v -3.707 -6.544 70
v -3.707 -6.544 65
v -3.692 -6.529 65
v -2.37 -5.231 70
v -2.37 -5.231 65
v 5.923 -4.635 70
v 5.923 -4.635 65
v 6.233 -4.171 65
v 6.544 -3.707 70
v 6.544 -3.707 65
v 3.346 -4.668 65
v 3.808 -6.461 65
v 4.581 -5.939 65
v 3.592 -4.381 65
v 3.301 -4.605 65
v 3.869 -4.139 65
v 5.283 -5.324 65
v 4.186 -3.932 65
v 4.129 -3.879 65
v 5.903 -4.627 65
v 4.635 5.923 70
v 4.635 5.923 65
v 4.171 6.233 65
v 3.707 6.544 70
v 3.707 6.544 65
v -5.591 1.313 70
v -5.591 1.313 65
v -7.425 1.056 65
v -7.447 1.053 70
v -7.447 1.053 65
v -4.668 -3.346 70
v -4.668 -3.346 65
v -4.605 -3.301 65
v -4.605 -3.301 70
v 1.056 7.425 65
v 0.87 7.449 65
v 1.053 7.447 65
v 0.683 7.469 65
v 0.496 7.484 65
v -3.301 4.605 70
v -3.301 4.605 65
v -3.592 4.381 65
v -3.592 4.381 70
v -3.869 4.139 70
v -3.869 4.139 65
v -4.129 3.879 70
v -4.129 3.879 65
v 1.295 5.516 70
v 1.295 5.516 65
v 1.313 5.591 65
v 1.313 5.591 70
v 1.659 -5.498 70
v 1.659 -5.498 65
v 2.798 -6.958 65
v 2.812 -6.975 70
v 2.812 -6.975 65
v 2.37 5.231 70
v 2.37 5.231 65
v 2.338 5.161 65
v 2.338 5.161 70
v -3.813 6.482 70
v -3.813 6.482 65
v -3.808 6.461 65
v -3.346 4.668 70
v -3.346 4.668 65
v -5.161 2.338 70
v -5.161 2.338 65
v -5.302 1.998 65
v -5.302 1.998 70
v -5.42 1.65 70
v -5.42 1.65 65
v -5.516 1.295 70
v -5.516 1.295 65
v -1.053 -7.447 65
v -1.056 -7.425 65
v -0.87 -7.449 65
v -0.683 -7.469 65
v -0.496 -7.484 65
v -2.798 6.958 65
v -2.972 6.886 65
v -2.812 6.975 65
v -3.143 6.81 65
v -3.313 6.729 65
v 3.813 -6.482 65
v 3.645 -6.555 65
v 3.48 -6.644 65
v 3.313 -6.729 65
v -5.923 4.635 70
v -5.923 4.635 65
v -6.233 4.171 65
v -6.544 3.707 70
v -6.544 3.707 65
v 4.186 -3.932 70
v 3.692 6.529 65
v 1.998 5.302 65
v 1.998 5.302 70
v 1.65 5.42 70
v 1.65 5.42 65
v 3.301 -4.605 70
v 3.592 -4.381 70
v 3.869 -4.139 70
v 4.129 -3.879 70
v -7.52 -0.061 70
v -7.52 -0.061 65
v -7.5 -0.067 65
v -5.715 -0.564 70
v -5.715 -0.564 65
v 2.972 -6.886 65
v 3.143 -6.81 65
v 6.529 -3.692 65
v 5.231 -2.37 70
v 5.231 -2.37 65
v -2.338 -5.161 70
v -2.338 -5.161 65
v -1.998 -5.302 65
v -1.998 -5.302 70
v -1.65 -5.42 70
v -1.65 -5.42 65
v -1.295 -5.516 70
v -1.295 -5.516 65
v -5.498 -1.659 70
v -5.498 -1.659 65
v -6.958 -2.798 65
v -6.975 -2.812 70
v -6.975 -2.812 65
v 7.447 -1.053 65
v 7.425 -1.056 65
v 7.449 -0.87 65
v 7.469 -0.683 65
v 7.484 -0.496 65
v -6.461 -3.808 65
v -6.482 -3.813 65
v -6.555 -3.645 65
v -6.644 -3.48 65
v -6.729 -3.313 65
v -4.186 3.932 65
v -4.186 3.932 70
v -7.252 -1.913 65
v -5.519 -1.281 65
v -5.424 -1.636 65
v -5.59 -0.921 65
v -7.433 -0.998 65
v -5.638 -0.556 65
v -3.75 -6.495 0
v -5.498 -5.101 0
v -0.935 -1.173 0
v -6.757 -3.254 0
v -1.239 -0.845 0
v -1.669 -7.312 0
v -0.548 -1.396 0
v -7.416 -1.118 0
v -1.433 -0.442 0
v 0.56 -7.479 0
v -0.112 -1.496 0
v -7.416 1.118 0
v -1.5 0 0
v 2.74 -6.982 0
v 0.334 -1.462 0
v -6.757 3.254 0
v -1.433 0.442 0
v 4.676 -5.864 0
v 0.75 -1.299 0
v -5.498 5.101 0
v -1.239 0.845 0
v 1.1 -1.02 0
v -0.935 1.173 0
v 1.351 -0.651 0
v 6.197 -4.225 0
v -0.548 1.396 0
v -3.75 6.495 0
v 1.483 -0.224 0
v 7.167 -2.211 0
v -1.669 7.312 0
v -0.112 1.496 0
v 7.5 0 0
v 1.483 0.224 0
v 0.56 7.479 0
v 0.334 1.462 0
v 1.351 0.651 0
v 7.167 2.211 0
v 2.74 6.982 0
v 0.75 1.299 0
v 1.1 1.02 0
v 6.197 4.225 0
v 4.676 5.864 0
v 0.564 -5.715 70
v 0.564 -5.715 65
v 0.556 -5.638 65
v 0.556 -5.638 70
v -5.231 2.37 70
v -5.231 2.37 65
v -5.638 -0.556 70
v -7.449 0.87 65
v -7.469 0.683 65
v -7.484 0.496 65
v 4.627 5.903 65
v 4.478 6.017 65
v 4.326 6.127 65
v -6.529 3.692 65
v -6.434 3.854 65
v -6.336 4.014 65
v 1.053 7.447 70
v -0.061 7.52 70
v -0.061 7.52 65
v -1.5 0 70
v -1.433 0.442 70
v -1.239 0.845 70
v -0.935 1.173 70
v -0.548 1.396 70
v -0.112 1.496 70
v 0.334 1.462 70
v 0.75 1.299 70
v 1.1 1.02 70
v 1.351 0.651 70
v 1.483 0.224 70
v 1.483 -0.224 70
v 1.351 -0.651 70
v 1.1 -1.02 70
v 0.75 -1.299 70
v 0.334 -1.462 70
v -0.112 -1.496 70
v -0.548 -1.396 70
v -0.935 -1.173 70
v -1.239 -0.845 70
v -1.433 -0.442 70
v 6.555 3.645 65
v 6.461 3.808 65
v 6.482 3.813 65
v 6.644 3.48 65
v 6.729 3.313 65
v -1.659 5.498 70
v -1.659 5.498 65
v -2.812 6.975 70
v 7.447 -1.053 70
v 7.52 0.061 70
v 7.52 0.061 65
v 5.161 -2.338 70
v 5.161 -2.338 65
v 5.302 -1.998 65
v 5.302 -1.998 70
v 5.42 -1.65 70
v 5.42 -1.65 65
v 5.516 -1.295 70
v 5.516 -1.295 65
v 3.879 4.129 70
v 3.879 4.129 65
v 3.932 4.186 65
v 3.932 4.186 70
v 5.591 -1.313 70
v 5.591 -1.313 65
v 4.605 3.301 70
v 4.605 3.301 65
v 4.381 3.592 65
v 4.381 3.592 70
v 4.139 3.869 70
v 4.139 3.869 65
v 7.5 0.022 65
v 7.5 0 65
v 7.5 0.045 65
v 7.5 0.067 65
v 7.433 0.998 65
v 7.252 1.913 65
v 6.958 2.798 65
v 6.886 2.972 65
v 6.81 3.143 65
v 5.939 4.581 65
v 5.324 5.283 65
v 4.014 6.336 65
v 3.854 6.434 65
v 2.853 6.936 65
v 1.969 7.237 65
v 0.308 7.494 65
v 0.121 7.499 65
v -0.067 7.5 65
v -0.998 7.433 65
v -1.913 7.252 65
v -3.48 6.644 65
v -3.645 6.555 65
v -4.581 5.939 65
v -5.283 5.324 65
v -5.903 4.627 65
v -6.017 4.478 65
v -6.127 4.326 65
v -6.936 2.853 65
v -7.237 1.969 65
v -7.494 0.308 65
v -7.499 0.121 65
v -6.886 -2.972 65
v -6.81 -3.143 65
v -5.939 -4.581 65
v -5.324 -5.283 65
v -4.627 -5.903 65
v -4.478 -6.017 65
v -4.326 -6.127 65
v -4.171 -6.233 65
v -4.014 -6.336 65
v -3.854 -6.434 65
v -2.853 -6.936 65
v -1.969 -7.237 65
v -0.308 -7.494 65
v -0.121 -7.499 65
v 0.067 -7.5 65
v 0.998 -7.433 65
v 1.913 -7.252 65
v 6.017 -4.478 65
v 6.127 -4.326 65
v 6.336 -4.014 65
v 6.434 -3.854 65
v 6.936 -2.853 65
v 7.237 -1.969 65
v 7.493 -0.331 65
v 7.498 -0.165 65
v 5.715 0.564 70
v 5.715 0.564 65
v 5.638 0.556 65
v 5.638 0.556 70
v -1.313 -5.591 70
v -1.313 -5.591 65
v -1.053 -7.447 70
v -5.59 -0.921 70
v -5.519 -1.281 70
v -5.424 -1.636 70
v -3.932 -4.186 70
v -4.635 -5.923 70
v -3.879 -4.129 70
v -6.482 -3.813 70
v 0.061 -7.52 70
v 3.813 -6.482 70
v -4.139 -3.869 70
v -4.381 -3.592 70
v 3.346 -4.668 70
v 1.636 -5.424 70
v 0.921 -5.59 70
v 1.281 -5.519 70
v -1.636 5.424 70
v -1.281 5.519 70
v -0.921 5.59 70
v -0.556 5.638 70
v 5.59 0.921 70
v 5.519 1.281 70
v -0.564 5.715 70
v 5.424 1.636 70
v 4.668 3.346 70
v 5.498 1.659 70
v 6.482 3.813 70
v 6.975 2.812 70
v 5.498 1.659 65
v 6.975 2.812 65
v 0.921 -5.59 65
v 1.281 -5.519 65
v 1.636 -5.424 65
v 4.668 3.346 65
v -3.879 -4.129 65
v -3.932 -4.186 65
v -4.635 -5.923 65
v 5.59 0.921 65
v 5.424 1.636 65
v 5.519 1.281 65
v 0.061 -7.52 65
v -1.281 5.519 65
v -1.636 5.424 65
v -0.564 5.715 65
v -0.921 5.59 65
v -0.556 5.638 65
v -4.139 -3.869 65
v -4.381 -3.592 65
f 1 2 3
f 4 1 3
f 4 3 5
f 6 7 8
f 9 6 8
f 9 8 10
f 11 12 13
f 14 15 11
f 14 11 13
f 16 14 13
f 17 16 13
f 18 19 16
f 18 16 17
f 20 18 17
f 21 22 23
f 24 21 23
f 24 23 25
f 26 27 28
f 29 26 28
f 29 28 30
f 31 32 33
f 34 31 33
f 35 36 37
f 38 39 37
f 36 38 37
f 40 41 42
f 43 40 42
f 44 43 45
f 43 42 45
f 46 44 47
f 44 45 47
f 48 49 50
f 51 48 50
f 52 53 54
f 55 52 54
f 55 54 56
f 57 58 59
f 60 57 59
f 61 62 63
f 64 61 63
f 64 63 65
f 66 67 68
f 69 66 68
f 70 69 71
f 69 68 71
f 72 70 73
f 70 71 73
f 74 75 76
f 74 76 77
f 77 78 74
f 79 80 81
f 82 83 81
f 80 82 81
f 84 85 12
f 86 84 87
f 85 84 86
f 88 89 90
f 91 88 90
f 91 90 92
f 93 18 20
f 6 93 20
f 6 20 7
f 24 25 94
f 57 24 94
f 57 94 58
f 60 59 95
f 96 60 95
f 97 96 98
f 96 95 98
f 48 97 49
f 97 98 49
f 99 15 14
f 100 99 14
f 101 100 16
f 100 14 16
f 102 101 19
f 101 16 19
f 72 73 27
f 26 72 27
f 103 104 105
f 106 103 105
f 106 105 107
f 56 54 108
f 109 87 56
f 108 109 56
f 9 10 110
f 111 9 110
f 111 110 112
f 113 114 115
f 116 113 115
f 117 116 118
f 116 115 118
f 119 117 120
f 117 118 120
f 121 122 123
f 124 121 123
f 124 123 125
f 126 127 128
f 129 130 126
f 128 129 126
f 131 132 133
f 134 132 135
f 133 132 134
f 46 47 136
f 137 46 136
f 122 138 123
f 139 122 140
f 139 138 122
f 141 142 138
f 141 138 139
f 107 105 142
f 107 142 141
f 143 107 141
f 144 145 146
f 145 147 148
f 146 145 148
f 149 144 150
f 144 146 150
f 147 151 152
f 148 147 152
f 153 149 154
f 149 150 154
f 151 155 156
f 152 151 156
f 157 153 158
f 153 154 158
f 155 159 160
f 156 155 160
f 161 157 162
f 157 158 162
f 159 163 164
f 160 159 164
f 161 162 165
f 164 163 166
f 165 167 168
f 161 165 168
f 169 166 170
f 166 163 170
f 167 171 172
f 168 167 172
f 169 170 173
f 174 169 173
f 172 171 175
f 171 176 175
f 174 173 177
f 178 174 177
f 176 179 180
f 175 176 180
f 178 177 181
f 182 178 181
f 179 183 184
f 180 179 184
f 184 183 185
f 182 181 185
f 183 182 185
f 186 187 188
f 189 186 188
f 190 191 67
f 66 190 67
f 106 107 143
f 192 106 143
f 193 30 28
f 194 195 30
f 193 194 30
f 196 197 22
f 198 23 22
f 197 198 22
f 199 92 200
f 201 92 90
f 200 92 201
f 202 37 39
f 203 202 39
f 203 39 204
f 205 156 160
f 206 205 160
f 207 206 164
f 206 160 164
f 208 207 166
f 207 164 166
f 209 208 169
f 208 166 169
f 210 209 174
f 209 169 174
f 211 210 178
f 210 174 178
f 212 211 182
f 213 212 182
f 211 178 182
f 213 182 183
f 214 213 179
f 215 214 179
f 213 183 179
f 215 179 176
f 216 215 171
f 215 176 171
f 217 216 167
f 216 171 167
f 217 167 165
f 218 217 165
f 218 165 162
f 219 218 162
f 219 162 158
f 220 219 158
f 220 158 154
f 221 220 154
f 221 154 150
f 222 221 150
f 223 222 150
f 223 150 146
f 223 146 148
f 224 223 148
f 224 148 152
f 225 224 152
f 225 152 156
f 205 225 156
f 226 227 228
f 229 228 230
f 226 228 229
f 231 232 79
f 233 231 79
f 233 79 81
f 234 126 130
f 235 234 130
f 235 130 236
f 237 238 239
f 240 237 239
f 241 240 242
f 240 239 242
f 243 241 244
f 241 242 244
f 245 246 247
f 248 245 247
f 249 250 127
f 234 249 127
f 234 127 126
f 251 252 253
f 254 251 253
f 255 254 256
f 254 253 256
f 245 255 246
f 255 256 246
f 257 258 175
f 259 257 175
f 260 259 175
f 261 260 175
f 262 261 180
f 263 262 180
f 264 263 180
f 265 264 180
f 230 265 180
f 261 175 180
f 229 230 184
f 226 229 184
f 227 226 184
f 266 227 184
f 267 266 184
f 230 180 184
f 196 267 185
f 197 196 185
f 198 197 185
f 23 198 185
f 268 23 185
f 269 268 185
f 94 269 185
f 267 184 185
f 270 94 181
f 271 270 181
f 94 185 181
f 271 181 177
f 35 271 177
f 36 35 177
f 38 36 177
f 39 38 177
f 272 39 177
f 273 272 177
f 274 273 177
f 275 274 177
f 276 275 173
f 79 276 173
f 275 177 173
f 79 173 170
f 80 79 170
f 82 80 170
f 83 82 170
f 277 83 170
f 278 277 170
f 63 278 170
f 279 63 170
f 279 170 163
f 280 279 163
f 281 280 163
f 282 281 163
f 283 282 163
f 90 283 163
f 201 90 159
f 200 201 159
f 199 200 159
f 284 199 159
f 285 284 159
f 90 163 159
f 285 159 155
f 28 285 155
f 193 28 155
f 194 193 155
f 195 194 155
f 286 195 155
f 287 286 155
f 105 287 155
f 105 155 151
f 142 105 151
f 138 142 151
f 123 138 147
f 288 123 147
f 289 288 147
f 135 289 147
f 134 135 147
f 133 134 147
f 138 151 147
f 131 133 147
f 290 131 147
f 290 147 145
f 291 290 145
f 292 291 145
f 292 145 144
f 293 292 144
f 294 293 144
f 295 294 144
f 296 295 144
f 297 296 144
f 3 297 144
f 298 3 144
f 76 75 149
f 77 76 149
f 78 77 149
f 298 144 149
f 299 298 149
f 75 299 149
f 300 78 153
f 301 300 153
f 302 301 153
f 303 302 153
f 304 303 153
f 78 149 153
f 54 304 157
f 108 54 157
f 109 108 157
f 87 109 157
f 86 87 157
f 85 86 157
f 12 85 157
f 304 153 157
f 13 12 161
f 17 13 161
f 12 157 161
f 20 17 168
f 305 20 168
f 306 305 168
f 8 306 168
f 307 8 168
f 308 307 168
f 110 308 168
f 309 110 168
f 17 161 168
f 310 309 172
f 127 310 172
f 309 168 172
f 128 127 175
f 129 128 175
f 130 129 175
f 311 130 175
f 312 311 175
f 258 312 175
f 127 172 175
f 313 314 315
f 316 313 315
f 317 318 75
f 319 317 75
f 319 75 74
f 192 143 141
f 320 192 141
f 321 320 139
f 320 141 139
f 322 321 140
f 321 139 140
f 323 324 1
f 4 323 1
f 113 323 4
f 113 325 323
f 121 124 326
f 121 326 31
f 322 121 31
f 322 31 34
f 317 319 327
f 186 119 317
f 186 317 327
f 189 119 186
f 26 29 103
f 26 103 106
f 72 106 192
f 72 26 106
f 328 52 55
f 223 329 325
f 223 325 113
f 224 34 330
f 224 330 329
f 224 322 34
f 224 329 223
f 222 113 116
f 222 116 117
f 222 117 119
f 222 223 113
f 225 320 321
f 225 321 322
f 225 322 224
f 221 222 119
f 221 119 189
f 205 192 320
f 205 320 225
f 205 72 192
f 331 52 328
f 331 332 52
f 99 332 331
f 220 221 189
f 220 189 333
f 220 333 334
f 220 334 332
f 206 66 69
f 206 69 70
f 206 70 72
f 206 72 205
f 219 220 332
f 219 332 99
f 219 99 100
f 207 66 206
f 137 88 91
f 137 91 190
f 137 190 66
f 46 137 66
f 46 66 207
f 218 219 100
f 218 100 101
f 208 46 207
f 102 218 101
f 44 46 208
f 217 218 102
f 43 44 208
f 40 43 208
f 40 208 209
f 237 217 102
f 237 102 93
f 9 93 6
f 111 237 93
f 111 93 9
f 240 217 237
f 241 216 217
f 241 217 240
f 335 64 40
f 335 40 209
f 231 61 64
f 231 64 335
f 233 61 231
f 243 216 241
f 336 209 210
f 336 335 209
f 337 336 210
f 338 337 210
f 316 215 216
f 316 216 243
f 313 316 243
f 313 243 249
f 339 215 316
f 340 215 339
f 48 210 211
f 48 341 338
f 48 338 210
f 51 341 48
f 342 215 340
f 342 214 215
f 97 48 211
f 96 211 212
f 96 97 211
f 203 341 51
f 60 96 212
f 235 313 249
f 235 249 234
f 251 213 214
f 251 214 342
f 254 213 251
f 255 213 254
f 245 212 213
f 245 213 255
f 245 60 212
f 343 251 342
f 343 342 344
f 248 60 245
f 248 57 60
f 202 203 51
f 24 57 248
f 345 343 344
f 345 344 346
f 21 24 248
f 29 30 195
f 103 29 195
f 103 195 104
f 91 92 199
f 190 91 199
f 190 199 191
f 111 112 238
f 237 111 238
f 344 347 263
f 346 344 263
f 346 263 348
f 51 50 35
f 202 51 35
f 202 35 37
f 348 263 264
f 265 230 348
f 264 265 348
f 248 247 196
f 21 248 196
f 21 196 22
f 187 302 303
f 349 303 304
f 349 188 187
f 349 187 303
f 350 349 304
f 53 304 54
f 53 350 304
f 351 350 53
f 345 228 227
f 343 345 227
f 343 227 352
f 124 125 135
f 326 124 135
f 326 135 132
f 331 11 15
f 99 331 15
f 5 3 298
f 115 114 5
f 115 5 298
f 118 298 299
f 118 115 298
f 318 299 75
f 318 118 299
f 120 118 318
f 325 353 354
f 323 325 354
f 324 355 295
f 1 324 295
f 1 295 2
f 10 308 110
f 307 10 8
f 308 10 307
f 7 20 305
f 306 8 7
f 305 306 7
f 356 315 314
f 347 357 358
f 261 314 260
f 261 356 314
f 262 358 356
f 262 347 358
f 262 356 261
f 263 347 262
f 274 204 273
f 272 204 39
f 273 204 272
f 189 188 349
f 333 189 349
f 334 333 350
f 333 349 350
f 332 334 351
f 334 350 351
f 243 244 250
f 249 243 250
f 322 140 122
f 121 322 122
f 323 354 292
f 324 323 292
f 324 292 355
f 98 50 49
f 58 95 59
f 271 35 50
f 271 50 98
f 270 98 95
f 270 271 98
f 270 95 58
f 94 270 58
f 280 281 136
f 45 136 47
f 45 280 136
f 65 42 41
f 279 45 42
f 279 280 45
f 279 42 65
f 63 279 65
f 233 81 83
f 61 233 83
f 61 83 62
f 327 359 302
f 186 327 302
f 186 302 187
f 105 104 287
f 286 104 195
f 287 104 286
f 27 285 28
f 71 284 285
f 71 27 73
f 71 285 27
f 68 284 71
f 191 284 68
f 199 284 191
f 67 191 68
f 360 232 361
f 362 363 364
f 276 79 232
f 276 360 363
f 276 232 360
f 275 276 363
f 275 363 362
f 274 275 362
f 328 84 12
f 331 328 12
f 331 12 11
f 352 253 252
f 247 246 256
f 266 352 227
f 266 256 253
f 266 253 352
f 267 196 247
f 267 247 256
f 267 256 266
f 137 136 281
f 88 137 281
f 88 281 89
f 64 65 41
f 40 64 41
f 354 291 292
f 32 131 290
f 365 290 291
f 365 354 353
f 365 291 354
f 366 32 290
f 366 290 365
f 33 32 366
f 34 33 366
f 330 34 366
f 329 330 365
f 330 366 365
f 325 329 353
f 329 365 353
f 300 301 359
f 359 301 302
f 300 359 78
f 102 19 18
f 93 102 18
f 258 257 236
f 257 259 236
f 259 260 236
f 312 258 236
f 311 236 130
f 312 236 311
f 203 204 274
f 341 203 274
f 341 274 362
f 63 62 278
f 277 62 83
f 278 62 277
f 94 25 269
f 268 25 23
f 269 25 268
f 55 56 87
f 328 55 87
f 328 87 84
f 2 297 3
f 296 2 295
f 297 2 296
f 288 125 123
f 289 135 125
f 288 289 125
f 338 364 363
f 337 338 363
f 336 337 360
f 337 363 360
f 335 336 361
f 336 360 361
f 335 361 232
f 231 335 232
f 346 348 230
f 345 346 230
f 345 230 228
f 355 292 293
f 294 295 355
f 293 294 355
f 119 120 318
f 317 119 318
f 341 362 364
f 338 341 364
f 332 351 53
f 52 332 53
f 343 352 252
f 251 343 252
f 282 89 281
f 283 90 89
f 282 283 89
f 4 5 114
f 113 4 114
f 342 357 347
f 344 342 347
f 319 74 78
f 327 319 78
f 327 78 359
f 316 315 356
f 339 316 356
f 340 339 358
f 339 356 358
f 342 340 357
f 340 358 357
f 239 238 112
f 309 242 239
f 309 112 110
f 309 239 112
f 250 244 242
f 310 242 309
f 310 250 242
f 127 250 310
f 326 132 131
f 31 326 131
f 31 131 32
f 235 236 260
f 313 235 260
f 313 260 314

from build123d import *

# Parameters (mm, degrees)
SKETCH1_R           = 7.5
BOSS_EXTRUDE1_DEPTH = 65
BOSS_EXTRUDE7_DEPTH = 5
SKETCH5_R           = 1.5
CUT_EXTRUDE1_DEPTH  = 71.803359707


with BuildPart() as part:
    # Sketch1 → Boss-Extrude1 (new body)
    with BuildSketch(Plane.XY):
        Circle(SKETCH1_R)
    extrude(amount=BOSS_EXTRUDE1_DEPTH)

    # Sketch4 → Boss-Extrude7 (add)
    with BuildSketch(Plane.XY.offset(65)):
        with BuildLine():
            Line((1.29482372, 5.515672238), (1.312530063, 5.591097474))
            Line((1.312530063, 5.591097474), (1.052683226, 7.446710482))
            Line((1.052683226, 7.446710482), (-0.061368597, 7.52049685))
            Line((-0.061368597, 7.52049685), (-0.563675613, 5.715363149))
            Line((-0.563675613, 5.715363149), (-0.556071495, 5.63826154))
            ThreePointArc((-0.556071495, 5.63826154), (0.374427225, 5.653230311), (1.29482372, 5.515672238))
        make_face()
        with BuildLine():
            ThreePointArc((2.337558729, 5.160913474), (1.824832598, 5.363692263), (1.29482372, 5.515672238))
            Line((1.29482372, 5.515672238), (0, 0))
            Line((0, 0), (2.337558729, 5.160913474))
        make_face()
        with BuildLine():
            Line((0, 0), (1.29482372, 5.515672238))
            ThreePointArc((1.29482372, 5.515672238), (0.374427225, 5.653230311), (-0.556071495, 5.63826154))
            Line((-0.556071495, 5.63826154), (0, 0))
        make_face()
        with BuildLine():
            Line((-1.636485884, 5.424124137), (0, 0))
            Line((0, 0), (-0.556071495, 5.63826154))
            ThreePointArc((-0.556071495, 5.63826154), (-1.101494744, 5.557510057), (-1.636485884, 5.424124137))
        make_face()
        with BuildLine():
            Line((2.337558729, 5.160913474), (0, 0))
            Line((0, 0), (3.879186354, 4.129300417))
            ThreePointArc((3.879186354, 4.129300417), (3.150878645, 4.708627451), (2.337558729, 5.160913474))
        make_face()
        with BuildLine():
            Line((4.604841979, 3.300702811), (0, 0))
            Line((0, 0), (5.424124137, 1.636485884))
            ThreePointArc((5.424124137, 1.636485884), (5.083054676, 2.502351667), (4.604841979, 3.300702811))
        make_face()
        with BuildLine():
            Line((3.879186354, 4.129300417), (0, 0))
            Line((0, 0), (4.604841979, 3.300702811))
            ThreePointArc((4.604841979, 3.300702811), (4.262197519, 3.732677459), (3.879186354, 4.129300417))
        make_face()
        with BuildLine():
            Line((5.63826154, 0.556071495), (0, 0))
            Line((0, 0), (5.515672238, -1.29482372))
            ThreePointArc((5.515672238, -1.29482372), (5.628005488, -0.651738388), (5.665616357, 0))
            ThreePointArc((5.665616357, 0), (5.65877352, 0.27837196), (5.63826154, 0.556071495))
        make_face()
        with BuildLine():
            Line((5.424124137, 1.636485884), (0, 0))
            Line((0, 0), (5.63826154, 0.556071495))
            ThreePointArc((5.63826154, 0.556071495), (5.557510057, 1.101494744), (5.424124137, 1.636485884))
        make_face()
        with BuildLine():
            Line((5.160913474, -2.337558729), (0, 0))
            Line((0, 0), (4.129300417, -3.879186354))
            ThreePointArc((4.129300417, -3.879186354), (4.708627451, -3.150878645), (5.160913474, -2.337558729))
        make_face()
        with BuildLine():
            Line((5.515672238, -1.29482372), (0, 0))
            Line((0, 0), (5.160913474, -2.337558729))
            ThreePointArc((5.160913474, -2.337558729), (5.363692263, -1.824832598), (5.515672238, -1.29482372))
        make_face()
        with BuildLine():
            Line((3.300702811, -4.604841979), (0, 0))
            Line((0, 0), (1.636485884, -5.424124137))
            ThreePointArc((1.636485884, -5.424124137), (2.502351667, -5.083054676), (3.300702811, -4.604841979))
        make_face()
        with BuildLine():
            Line((4.129300417, -3.879186354), (0, 0))
            Line((0, 0), (3.300702811, -4.604841979))
            ThreePointArc((3.300702811, -4.604841979), (3.732677459, -4.262197519), (4.129300417, -3.879186354))
        make_face()
        with BuildLine():
            Line((0.556071495, -5.63826154), (0, 0))
            Line((0, 0), (-1.29482372, -5.515672238))
            ThreePointArc((-1.29482372, -5.515672238), (-0.374427225, -5.653230311), (0.556071495, -5.63826154))
        make_face()
        with BuildLine():
            Line((1.636485884, -5.424124137), (0, 0))
            Line((0, 0), (0.556071495, -5.63826154))
            ThreePointArc((0.556071495, -5.63826154), (1.101494744, -5.557510057), (1.636485884, -5.424124137))
        make_face()
        with BuildLine():
            Line((-2.337558729, -5.160913474), (0, 0))
            Line((0, 0), (-3.879186354, -4.129300417))
            ThreePointArc((-3.879186354, -4.129300417), (-3.150878645, -4.708627451), (-2.337558729, -5.160913474))
        make_face()
        with BuildLine():
            Line((-1.29482372, -5.515672238), (0, 0))
            Line((0, 0), (-2.337558729, -5.160913474))
            ThreePointArc((-2.337558729, -5.160913474), (-1.824832598, -5.363692263), (-1.29482372, -5.515672238))
        make_face()
        with BuildLine():
            Line((-4.604841979, -3.300702811), (0, 0))
            Line((0, 0), (-5.424124137, -1.636485884))
            ThreePointArc((-5.424124137, -1.636485884), (-5.083054676, -2.502351667), (-4.604841979, -3.300702811))
        make_face()
        with BuildLine():
            Line((-3.879186354, -4.129300417), (0, 0))
            Line((0, 0), (-4.604841979, -3.300702811))
            ThreePointArc((-4.604841979, -3.300702811), (-4.262197519, -3.732677459), (-3.879186354, -4.129300417))
        make_face()
        with BuildLine():
            Line((-5.63826154, -0.556071495), (0, 0))
            Line((0, 0), (-5.515672238, 1.29482372))
            ThreePointArc((-5.515672238, 1.29482372), (-5.653230311, 0.374427225), (-5.63826154, -0.556071495))
        make_face()
        with BuildLine():
            Line((-5.424124137, -1.636485884), (0, 0))
            Line((0, 0), (-5.63826154, -0.556071495))
            ThreePointArc((-5.63826154, -0.556071495), (-5.557510057, -1.101494744), (-5.424124137, -1.636485884))
        make_face()
        with BuildLine():
            Line((-5.160913474, 2.337558729), (0, 0))
            Line((0, 0), (-4.129300417, 3.879186354))
            ThreePointArc((-4.129300417, 3.879186354), (-4.708627451, 3.150878645), (-5.160913474, 2.337558729))
        make_face()
        with BuildLine():
            Line((-5.515672238, 1.29482372), (0, 0))
            Line((0, 0), (-5.160913474, 2.337558729))
            ThreePointArc((-5.160913474, 2.337558729), (-5.363692263, 1.824832598), (-5.515672238, 1.29482372))
        make_face()
        with BuildLine():
            Line((-3.300702811, 4.604841979), (0, 0))
            Line((0, 0), (-1.636485884, 5.424124137))
            ThreePointArc((-1.636485884, 5.424124137), (-2.502351667, 5.083054676), (-3.300702811, 4.604841979))
        make_face()
        with BuildLine():
            Line((-4.129300417, 3.879186354), (0, 0))
            Line((0, 0), (-3.300702811, 4.604841979))
            ThreePointArc((-3.300702811, 4.604841979), (-3.732677459, 4.262197519), (-4.129300417, 3.879186354))
        make_face()
        with BuildLine():
            Line((2.369524174, 5.231487486), (2.337558729, 5.160913474))
            ThreePointArc((2.337558729, 5.160913474), (3.150878645, 4.708627451), (3.879186354, 4.129300417))
            Line((3.879186354, 4.129300417), (3.932233115, 4.185767416))
            Line((3.932233115, 4.185767416), (4.635005657, 5.922698839))
            Line((4.635005657, 5.922698839), (3.707101661, 6.54362562))
            Line((3.707101661, 6.54362562), (2.369524174, 5.231487486))
        make_face()
        with BuildLine():
            ThreePointArc((4.604841979, 3.300702811), (5.083054676, 2.502351667), (5.424124137, 1.636485884))
            Line((5.424124137, 1.636485884), (5.498297479, 1.658864359))
            Line((5.498297479, 1.658864359), (6.975382065, 2.811704825))
            Line((6.975382065, 2.811704825), (6.482257022, 3.813395189))
            Line((6.482257022, 3.813395189), (4.667811873, 3.345838975))
            Line((4.667811873, 3.345838975), (4.604841979, 3.300702811))
        make_face()
        with BuildLine():
            ThreePointArc((5.665616357, 0), (5.628005488, -0.651738388), (5.515672238, -1.29482372))
            Line((5.515672238, -1.29482372), (5.591097474, -1.312530063))
            Line((5.591097474, -1.312530063), (7.446710482, -1.052683226))
            Line((7.446710482, -1.052683226), (7.52049685, 0.061368597))
            Line((7.52049685, 0.061368597), (5.715363149, 0.563675613))
            Line((5.715363149, 0.563675613), (5.63826154, 0.556071495))
            ThreePointArc((5.63826154, 0.556071495), (5.65877352, 0.27837196), (5.665616357, 0))
        make_face()
        with BuildLine():
            ThreePointArc((5.160913474, -2.337558729), (4.708627451, -3.150878645), (4.129300417, -3.879186354))
            Line((4.129300417, -3.879186354), (4.185767416, -3.932233115))
            Line((4.185767416, -3.932233115), (5.922698839, -4.635005657))
            Line((5.922698839, -4.635005657), (6.54362562, -3.707101661))
            Line((6.54362562, -3.707101661), (5.231487486, -2.369524174))
            Line((5.231487486, -2.369524174), (5.160913474, -2.337558729))
        make_face()
        with BuildLine():
            ThreePointArc((3.300702811, -4.604841979), (2.502351667, -5.083054676), (1.636485884, -5.424124137))
            Line((1.636485884, -5.424124137), (1.658864359, -5.498297479))
            Line((1.658864359, -5.498297479), (2.811704825, -6.975382065))
            Line((2.811704825, -6.975382065), (3.813395189, -6.482257022))
            Line((3.813395189, -6.482257022), (3.345838975, -4.667811873))
            Line((3.345838975, -4.667811873), (3.300702811, -4.604841979))
        make_face()
        with BuildLine():
            ThreePointArc((0.556071495, -5.63826154), (-0.374427225, -5.653230311), (-1.29482372, -5.515672238))
            Line((-1.29482372, -5.515672238), (-1.312530063, -5.591097474))
            Line((-1.312530063, -5.591097474), (-1.052683226, -7.446710482))
            Line((-1.052683226, -7.446710482), (0.061368597, -7.52049685))
            Line((0.061368597, -7.52049685), (0.563675613, -5.715363149))
            Line((0.563675613, -5.715363149), (0.556071495, -5.63826154))
        make_face()
        with BuildLine():
            ThreePointArc((-2.337558729, -5.160913474), (-3.150878645, -4.708627451), (-3.879186354, -4.129300417))
            Line((-3.879186354, -4.129300417), (-3.932233115, -4.185767416))
            Line((-3.932233115, -4.185767416), (-4.635005657, -5.922698839))
            Line((-4.635005657, -5.922698839), (-3.707101661, -6.54362562))
            Line((-3.707101661, -6.54362562), (-2.369524174, -5.231487486))
            Line((-2.369524174, -5.231487486), (-2.337558729, -5.160913474))
        make_face()
        with BuildLine():
            ThreePointArc((-4.604841979, -3.300702811), (-5.083054676, -2.502351667), (-5.424124137, -1.636485884))
            Line((-5.424124137, -1.636485884), (-5.498297479, -1.658864359))
            Line((-5.498297479, -1.658864359), (-6.975382065, -2.811704825))
            Line((-6.975382065, -2.811704825), (-6.482257022, -3.813395189))
            Line((-6.482257022, -3.813395189), (-4.667811873, -3.345838975))
            Line((-4.667811873, -3.345838975), (-4.604841979, -3.300702811))
        make_face()
        with BuildLine():
            ThreePointArc((-5.63826154, -0.556071495), (-5.653230311, 0.374427225), (-5.515672238, 1.29482372))
            Line((-5.515672238, 1.29482372), (-5.591097474, 1.312530063))
            Line((-5.591097474, 1.312530063), (-7.446710482, 1.052683226))
            Line((-7.446710482, 1.052683226), (-7.52049685, -0.061368597))
            Line((-7.52049685, -0.061368597), (-5.715363149, -0.563675613))
            Line((-5.715363149, -0.563675613), (-5.63826154, -0.556071495))
        make_face()
        with BuildLine():
            ThreePointArc((-5.160913474, 2.337558729), (-4.708627451, 3.150878645), (-4.129300417, 3.879186354))
            Line((-4.129300417, 3.879186354), (-4.185767416, 3.932233115))
            Line((-4.185767416, 3.932233115), (-5.922698839, 4.635005657))
            Line((-5.922698839, 4.635005657), (-6.54362562, 3.707101661))
            Line((-6.54362562, 3.707101661), (-5.231487486, 2.369524174))
            Line((-5.231487486, 2.369524174), (-5.160913474, 2.337558729))
        make_face()
        with BuildLine():
            ThreePointArc((-3.300702811, 4.604841979), (-2.502351667, 5.083054676), (-1.636485884, 5.424124137))
            Line((-1.636485884, 5.424124137), (-1.658864359, 5.498297479))
            Line((-1.658864359, 5.498297479), (-2.811704825, 6.975382065))
            Line((-2.811704825, 6.975382065), (-3.813395189, 6.482257022))
            Line((-3.813395189, 6.482257022), (-3.345838975, 4.667811873))
            Line((-3.345838975, 4.667811873), (-3.300702811, 4.604841979))
        make_face()
    extrude(amount=BOSS_EXTRUDE7_DEPTH)

    # Sketch5 → Cut-Extrude1 (cut, through all)
    with BuildSketch(Plane(origin=(0, 0, 0), x_dir=(-1, 0, 0), z_dir=(0, 0, -1))):
        Circle(SKETCH5_R)
    extrude(amount=-CUT_EXTRUDE1_DEPTH, mode=Mode.SUBTRACT)


solid = part.part
